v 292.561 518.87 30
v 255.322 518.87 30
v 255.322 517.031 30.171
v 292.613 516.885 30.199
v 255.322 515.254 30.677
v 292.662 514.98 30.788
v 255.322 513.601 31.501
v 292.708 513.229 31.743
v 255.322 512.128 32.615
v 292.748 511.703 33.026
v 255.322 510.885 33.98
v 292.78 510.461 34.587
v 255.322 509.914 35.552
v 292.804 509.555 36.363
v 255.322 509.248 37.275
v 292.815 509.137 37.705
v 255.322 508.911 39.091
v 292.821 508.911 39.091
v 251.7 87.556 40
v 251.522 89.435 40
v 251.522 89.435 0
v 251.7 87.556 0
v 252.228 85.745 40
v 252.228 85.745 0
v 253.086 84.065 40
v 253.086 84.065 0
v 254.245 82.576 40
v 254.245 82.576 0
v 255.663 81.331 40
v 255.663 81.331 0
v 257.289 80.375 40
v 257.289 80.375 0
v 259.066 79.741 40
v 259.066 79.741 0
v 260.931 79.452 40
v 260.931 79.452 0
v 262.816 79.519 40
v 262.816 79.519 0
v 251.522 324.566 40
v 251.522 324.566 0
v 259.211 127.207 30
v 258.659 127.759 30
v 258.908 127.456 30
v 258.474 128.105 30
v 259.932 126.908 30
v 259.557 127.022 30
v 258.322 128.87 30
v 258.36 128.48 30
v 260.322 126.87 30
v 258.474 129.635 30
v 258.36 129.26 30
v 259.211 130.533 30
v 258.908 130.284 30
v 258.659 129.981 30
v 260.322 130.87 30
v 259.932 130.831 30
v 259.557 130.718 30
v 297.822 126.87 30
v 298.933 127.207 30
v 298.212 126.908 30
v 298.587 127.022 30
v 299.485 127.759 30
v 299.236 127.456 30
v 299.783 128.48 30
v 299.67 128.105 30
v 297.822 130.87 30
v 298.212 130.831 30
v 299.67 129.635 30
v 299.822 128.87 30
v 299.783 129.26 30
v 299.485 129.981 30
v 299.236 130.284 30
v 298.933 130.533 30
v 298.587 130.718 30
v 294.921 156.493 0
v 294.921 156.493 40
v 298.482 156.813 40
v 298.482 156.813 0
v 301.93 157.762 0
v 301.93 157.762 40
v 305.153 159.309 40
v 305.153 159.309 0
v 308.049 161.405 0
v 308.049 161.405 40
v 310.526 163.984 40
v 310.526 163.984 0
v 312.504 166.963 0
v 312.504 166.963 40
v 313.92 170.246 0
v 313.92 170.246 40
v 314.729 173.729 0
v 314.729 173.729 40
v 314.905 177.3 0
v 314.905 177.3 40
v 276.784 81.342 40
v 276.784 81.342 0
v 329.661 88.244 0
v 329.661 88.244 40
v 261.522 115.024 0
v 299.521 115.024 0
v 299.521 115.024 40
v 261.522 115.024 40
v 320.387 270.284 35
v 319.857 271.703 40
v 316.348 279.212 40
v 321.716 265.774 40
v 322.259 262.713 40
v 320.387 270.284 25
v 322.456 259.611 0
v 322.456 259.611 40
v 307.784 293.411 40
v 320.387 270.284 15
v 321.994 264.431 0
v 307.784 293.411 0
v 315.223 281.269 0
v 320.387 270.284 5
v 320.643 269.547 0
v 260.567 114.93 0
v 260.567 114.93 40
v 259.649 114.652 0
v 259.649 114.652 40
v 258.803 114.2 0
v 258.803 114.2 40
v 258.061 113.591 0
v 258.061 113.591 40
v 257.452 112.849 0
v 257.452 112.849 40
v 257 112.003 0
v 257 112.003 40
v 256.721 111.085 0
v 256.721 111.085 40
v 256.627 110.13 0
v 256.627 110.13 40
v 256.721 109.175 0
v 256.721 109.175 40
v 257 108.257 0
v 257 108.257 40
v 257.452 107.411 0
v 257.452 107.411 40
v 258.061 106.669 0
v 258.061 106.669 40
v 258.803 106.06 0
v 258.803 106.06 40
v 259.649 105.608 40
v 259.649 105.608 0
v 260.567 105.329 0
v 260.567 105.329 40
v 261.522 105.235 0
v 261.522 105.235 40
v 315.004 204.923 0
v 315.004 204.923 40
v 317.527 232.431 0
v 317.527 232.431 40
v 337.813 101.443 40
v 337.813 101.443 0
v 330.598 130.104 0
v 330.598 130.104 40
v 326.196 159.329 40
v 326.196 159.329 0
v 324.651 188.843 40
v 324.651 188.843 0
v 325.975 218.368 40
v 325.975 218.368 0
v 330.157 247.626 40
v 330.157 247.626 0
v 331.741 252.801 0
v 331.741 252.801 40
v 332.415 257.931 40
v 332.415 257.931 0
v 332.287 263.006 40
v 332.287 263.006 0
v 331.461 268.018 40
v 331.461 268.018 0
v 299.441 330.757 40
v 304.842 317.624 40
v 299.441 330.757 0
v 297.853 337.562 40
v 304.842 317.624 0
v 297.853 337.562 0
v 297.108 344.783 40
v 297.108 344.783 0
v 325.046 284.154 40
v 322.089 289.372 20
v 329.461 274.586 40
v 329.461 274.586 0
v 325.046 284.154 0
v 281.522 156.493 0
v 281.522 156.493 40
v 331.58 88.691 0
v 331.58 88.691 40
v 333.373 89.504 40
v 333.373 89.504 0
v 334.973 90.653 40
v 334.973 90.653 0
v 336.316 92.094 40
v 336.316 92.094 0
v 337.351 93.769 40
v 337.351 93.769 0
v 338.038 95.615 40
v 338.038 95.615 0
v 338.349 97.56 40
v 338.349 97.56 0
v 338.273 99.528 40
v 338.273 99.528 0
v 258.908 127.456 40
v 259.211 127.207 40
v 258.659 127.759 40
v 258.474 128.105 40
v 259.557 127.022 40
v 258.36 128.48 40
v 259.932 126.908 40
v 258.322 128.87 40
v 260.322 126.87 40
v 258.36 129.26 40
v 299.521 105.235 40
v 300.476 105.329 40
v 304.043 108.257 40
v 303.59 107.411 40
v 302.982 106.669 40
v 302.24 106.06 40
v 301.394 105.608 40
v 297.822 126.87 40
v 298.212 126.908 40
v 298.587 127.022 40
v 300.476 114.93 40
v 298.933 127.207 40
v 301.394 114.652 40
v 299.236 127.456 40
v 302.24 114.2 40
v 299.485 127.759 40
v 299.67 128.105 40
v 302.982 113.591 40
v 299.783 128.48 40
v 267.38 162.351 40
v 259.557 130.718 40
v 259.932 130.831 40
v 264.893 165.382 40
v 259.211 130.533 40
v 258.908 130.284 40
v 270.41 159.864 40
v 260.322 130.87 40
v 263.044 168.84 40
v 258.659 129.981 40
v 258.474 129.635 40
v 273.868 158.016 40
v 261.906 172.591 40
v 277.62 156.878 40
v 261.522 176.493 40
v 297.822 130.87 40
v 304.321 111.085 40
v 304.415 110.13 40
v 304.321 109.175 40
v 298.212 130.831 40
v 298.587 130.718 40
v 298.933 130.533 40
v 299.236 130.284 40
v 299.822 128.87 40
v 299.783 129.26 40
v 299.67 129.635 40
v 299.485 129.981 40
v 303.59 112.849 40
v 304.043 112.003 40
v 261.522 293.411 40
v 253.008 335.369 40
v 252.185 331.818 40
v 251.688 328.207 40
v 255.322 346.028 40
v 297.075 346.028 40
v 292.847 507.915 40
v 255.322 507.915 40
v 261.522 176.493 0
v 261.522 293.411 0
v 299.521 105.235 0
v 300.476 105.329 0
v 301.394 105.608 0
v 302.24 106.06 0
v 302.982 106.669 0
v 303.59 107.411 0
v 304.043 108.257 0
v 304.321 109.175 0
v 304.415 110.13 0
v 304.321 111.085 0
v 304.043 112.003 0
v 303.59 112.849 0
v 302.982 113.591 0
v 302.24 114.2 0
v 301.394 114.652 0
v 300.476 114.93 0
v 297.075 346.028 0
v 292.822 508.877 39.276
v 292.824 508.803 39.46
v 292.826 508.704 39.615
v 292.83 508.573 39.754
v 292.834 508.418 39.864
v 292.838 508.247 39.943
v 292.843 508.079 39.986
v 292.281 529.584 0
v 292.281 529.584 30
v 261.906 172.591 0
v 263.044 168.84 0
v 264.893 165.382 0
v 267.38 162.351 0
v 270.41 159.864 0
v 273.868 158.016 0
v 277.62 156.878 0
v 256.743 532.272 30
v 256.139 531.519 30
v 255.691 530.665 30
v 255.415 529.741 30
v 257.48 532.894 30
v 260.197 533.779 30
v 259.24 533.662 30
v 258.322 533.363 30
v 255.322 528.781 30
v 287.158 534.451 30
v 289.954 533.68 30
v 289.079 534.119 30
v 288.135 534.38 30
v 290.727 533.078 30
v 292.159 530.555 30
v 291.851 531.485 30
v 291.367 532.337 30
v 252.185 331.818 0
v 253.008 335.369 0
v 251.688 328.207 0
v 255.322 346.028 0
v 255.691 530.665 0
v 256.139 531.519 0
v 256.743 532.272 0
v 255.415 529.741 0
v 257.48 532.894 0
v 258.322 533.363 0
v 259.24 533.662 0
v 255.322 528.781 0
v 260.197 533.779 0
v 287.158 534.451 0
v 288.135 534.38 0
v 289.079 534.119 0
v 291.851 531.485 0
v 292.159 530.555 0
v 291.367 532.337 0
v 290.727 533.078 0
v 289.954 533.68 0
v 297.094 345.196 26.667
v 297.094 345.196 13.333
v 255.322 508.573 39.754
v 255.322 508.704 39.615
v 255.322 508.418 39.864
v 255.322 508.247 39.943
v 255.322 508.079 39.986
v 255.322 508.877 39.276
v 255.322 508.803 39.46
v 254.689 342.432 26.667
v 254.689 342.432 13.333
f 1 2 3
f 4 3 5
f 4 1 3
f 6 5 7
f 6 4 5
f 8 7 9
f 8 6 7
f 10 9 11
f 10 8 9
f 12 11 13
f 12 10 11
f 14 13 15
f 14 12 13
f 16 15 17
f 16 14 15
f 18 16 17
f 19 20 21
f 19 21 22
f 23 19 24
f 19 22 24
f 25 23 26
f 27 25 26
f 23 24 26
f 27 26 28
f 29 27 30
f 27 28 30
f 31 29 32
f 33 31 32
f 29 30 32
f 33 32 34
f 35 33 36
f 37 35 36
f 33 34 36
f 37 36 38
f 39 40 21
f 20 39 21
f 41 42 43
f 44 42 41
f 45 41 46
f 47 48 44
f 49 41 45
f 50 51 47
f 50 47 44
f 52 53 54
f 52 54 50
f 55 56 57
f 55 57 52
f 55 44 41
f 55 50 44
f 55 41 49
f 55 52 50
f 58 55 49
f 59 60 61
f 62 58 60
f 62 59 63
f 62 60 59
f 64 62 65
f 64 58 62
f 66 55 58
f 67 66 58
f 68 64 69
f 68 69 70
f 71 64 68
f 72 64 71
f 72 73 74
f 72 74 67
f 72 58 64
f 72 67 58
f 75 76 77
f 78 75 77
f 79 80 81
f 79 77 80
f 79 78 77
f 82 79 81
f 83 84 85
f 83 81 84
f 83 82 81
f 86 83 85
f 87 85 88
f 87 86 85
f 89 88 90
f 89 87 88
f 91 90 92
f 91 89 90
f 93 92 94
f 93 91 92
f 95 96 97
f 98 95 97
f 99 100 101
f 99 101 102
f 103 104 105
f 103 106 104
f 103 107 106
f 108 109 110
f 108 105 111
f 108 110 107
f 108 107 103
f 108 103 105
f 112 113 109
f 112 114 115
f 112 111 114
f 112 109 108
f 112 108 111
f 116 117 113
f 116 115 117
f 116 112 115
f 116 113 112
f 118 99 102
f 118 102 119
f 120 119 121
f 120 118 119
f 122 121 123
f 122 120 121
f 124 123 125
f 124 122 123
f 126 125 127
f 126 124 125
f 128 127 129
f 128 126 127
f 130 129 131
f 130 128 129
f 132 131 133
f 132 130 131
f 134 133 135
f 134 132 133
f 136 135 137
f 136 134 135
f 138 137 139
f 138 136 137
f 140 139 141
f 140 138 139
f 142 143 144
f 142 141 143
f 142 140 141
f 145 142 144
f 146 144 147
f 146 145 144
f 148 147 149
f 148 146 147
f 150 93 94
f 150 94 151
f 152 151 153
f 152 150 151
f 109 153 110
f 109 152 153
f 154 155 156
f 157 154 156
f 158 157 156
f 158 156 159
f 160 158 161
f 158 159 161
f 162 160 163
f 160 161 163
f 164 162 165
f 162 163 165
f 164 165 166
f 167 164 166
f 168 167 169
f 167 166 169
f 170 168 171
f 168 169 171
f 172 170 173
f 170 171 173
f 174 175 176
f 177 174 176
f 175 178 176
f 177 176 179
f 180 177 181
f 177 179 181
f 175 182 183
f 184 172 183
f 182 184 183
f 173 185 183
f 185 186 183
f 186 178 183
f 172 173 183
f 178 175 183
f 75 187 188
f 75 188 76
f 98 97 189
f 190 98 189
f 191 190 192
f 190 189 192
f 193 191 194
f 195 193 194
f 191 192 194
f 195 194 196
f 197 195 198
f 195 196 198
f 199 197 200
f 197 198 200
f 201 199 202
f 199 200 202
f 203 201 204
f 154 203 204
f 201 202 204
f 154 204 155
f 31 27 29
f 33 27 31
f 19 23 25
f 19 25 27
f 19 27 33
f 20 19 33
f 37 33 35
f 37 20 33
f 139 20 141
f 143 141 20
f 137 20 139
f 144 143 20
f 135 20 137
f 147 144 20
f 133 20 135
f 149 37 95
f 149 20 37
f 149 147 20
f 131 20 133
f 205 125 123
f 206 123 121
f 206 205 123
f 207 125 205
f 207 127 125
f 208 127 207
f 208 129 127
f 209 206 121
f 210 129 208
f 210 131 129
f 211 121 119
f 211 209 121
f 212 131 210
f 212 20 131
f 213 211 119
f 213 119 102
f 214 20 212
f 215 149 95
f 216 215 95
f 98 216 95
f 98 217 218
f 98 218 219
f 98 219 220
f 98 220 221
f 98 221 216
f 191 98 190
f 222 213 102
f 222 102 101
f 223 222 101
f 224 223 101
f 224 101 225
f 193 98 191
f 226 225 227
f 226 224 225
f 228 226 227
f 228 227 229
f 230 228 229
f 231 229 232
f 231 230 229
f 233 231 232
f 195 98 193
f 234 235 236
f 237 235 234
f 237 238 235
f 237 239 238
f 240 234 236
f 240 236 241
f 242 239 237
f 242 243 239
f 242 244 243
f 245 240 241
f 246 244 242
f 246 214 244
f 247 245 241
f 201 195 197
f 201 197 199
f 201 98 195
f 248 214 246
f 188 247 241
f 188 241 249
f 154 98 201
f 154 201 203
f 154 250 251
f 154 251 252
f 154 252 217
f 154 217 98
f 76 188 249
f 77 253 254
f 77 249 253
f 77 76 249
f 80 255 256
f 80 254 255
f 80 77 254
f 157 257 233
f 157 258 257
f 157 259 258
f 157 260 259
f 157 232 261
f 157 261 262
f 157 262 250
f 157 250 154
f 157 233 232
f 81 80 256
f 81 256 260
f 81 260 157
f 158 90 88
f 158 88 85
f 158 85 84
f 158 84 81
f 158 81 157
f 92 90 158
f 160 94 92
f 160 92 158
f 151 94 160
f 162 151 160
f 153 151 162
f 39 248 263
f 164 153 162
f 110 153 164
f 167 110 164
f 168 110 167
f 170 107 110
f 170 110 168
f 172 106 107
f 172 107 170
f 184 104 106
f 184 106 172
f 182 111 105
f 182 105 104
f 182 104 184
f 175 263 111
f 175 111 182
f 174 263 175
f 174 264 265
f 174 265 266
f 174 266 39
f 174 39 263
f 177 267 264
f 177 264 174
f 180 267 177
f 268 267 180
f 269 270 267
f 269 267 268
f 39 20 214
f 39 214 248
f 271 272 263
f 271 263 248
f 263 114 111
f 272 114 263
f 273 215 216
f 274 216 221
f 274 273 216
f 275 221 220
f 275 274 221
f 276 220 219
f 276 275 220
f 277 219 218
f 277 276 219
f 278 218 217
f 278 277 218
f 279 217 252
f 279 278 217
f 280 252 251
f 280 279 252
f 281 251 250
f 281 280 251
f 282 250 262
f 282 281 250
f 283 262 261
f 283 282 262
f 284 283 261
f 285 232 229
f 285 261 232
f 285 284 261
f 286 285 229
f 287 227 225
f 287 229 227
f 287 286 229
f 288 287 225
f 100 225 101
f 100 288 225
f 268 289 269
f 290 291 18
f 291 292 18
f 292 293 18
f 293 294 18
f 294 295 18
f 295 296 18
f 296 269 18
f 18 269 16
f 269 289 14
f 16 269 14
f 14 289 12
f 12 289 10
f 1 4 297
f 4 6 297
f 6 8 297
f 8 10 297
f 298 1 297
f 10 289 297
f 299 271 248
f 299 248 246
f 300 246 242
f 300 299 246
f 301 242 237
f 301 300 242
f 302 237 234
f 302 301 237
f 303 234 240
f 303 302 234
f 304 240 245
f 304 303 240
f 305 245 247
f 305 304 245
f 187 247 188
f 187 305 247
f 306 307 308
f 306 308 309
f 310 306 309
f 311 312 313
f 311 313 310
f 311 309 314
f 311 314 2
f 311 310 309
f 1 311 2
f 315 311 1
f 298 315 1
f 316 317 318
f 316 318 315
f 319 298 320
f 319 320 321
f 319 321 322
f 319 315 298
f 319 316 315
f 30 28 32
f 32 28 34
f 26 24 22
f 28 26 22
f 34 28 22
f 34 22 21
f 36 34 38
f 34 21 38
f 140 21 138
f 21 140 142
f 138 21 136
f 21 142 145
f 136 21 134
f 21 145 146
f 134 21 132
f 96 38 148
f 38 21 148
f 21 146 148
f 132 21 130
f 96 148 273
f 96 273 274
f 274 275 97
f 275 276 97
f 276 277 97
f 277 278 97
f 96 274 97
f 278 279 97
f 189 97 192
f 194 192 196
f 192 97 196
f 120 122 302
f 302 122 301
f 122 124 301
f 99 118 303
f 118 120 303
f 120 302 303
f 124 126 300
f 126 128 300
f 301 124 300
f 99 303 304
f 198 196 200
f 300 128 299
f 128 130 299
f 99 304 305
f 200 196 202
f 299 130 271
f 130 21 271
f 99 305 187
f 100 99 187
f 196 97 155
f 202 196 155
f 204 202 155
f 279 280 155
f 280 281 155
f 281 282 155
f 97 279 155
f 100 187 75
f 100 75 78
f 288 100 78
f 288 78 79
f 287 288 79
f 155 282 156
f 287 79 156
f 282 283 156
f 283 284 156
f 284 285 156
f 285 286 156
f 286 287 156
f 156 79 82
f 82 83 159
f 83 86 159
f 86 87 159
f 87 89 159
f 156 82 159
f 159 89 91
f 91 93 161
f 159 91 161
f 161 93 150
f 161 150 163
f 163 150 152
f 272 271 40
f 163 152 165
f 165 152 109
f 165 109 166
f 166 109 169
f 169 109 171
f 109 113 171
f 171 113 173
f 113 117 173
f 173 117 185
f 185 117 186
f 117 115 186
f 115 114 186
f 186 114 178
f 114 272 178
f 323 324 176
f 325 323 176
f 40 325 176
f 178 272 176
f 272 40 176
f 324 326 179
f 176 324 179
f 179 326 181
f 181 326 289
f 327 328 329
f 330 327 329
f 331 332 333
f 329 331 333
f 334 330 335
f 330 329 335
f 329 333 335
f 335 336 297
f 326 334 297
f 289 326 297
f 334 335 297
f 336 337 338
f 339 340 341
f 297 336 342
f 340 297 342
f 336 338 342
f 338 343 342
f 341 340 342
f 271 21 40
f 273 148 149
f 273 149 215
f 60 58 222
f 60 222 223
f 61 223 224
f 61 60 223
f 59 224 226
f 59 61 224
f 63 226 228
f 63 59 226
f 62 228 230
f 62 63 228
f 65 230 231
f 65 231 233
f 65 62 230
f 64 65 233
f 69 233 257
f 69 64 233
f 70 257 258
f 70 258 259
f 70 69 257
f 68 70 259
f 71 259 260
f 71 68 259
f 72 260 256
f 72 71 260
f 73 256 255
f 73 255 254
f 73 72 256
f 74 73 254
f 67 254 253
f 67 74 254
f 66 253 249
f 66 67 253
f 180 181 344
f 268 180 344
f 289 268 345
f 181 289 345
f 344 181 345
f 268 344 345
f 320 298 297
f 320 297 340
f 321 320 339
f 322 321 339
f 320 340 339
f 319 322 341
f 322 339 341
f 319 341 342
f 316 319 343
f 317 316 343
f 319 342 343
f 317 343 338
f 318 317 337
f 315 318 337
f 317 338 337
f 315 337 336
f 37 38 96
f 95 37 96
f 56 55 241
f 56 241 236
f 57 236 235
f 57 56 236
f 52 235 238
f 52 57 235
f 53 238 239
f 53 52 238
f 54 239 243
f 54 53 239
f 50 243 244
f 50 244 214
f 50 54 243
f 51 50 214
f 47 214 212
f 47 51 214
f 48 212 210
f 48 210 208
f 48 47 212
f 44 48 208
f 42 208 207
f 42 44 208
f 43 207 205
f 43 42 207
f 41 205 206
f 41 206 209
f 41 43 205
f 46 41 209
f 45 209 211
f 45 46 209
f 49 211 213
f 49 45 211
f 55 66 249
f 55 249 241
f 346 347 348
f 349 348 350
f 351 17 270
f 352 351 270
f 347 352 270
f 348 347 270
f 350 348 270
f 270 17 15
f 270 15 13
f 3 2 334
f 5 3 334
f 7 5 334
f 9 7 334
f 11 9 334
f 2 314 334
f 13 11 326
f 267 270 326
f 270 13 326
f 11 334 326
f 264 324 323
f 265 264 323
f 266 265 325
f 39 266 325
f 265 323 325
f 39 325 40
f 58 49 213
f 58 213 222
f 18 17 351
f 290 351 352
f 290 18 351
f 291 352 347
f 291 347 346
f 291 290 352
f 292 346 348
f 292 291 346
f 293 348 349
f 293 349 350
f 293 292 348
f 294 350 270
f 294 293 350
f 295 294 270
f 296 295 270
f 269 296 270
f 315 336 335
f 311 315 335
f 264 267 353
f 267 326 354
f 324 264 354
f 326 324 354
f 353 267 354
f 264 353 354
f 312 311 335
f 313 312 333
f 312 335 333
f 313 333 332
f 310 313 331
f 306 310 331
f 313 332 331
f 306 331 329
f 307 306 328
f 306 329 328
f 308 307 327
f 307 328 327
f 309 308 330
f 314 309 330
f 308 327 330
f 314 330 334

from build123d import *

# Parameters (mm, degrees)
BOSS_EXTRUDE3_DEPTH = 40
CUT_EXTRUDE1_START  = -10
CUT_EXTRUDE1_DEPTH  = 10
FILLET3_R           = 10
FILLET4_R           = 1
CUT_EXTRUDE3_DEPTH  = 634.823473561


with BuildPart() as part:
    # Sketch1 → Boss-Extrude3 (new body)
    with BuildSketch(Plane.XY):
        with BuildLine():
            Line((287.157860281, 534.451448831), (260.19721277, 533.779001198))
            ThreePointArc((260.19721277, 533.779001198), (256.742542962, 532.271733759), (255.321883101, 528.780555709))
            Line((255.321883101, 528.780555709), (255.321883101, 346.027702032))
            Line((255.321883101, 346.027702032), (255.321883101, 298.309919691))
            Line((255.321883101, 298.309919691), (298.321883101, 298.309919691))
            Line((298.321883101, 298.309919691), (297.107965759, 344.783089771))
            add(Edge.make_bspline(
                [(297.107965759, 344.783089771), (297.092597, 345.195665623), (297.081725868, 345.610516215), (297.075455466, 346.027702032)],
                knots=[0.989098045, 0.989098045, 0.989098045, 0.989098045, 1, 1, 1, 1], degree=3))
            Line((297.075455466, 346.027702032), (292.280825741, 529.583562912))
            ThreePointArc((292.280825741, 529.583562912), (290.726675353, 533.077622908), (287.157860281, 534.451448831))
        make_face()
        with BuildLine():
            Line((255.321883101, 298.309919691), (255.321883101, 346.027702032))
            add(Edge.make_bspline(
                [(255.321883101, 346.027702032), (254.757957002, 342.410351737), (253.98676421, 338.857518857), (253.008304725, 335.36920339)],
                knots=[0, 0, 0, 0, 0.135221531, 0.135221531, 0.135221531, 0.135221531], degree=3))
            ThreePointArc((253.008304725, 335.36920339), (251.895242603, 330.018633631), (251.521898803, 324.566283821))
            Line((251.521898803, 324.566283821), (251.521898803, 112.494253422))
            Line((251.521898803, 112.494253422), (251.521898803, 107.975148622))
            Line((251.521898803, 107.975148622), (251.521898803, 107.687415528))
            Line((251.521898803, 107.687415528), (251.521898803, 107.377085198))
            Line((251.521898803, 107.377085198), (251.521898803, 89.434656666))
            ThreePointArc((251.521898803, 89.434656666), (254.924316425, 81.919877444), (262.816280156, 79.518781671))
            Line((262.816280156, 79.518781671), (276.783936318, 81.342067431))
            Line((276.783936318, 81.342067431), (329.661316312, 88.244483474))
            ThreePointArc((329.661316312, 88.244483474), (336.875168963, 92.905840971), (337.812674038, 101.443346932))
            ThreePointArc((337.812674038, 101.443346932), (325.065095163, 174.067394927), (330.156614349, 247.625736037))
            add(Edge.make_bspline(
                [(330.156614349, 247.625736037), (336.006706917, 262.277420591), (320.933871266, 296.427871643), (297.92215095, 322.926208236), (297.107965759, 344.783089771)],
                knots=[0, 0, 0, 0, 0.411549101, 0.989098045, 0.989098045, 0.989098045, 0.989098045], degree=3))
            Line((297.107965759, 344.783089771), (298.321883101, 298.309919691))
            Line((298.321883101, 298.309919691), (255.321883101, 298.309919691))
        make_face()
    extrude(amount=BOSS_EXTRUDE3_DEPTH)

    # Sketch3 → Cut-Extrude1 (cut)
    with BuildSketch(Plane.XY.offset(40).offset(CUT_EXTRUDE1_START)):
        with BuildLine():
            Line((255.321883101, 508.869919691), (292.821883101, 508.869919691))
            Line((292.821883101, 508.869919691), (292.280825741, 529.583562912))
            ThreePointArc((292.280825741, 529.583562912), (290.726675353, 533.077622908), (287.157860281, 534.451448831))
            Line((287.157860281, 534.451448831), (260.19721277, 533.779001198))
            ThreePointArc((260.19721277, 533.779001198), (256.742542962, 532.271733759), (255.321883101, 528.780555709))
            Line((255.321883101, 528.780555709), (255.321883101, 508.869919691))
        make_face()
        with BuildLine():
            Line((260.321883101, 126.869919691), (297.821883101, 126.869919691))
            ThreePointArc((297.821883101, 126.869919691), (299.821883101, 128.869919691), (297.821883101, 130.869919691))
            Line((297.821883101, 130.869919691), (260.321883101, 130.869919691))
            ThreePointArc((260.321883101, 130.869919691), (258.321883101, 128.869919691), (260.321883101, 126.869919691))
        make_face()
    extrude(amount=CUT_EXTRUDE1_DEPTH, mode=Mode.SUBTRACT)

    # Fillet3
    fillet3_edges = [part.edges().sort_by_distance(p)[0] for p in [
        (274.071883101, 508.869919691, 30),
    ]]
    fillet(fillet3_edges, radius=FILLET3_R - 0.0001)  # a hair under: the kernel refuses the full size

    # Fillet4
    fillet4_edges = [part.edges().sort_by_distance(p)[0] for p in [
        (274.071883101, 508.869919691, 40),
    ]]
    fillet(fillet4_edges, radius=FILLET4_R)

    # Sketch7 → Cut-Extrude3 (cut, through all)
    with BuildSketch(Plane.XY):
        with BuildLine():
            Line((261.521898803, 105.235423074), (299.520758285, 105.235423074))
            ThreePointArc((299.520758285, 105.235423074), (304.415246799, 110.129911588), (299.520758285, 115.024400103))
            Line((299.520758285, 115.024400103), (261.521898803, 115.024400103))
            ThreePointArc((261.521898803, 115.024400103), (256.627410288, 110.129911588), (261.521898803, 105.235423074))
        make_face()
        with BuildLine():
            Line((307.783918876, 293.411121556), (261.521898803, 293.411121556))
            Line((261.521898803, 293.411121556), (261.521898803, 176.49325551))
            ThreePointArc((261.521898803, 176.49325551), (267.379763179, 162.351119886), (281.521898803, 156.49325551))
            Line((281.521898803, 156.49325551), (294.92087878, 156.49325551))
            ThreePointArc((294.92087878, 156.49325551), (309.345533596, 162.639399244), (314.90458823, 177.300322166))
            ThreePointArc((314.90458823, 177.300322166), (315.963249783, 218.705128996), (322.4563298, 259.611347408))
            add(Edge.make_bspline(
                [(322.4563298, 259.611347408), (322.456016347, 259.894497294), (322.421435552, 261.716157514), (321.977489562, 265.178835066), (320.516125801, 270.243060555), (318.282615138, 275.554318374), (315.425430629, 281.021812849), (312.162343995, 286.528772314), (309.555661166, 290.650913462), (308.084642597, 292.943229146), (307.783918876, 293.411121556)],
                knots=[0.113442682, 0.113442682, 0.113442682, 0.113442682, 0.125, 0.1875, 0.25, 0.3125, 0.375, 0.4375, 0.498593555, 0.514218555, 0.514218555, 0.514218555, 0.514218555], degree=3))
        make_face()
    extrude(amount=CUT_EXTRUDE3_DEPTH, mode=Mode.SUBTRACT)


solid = part.part
